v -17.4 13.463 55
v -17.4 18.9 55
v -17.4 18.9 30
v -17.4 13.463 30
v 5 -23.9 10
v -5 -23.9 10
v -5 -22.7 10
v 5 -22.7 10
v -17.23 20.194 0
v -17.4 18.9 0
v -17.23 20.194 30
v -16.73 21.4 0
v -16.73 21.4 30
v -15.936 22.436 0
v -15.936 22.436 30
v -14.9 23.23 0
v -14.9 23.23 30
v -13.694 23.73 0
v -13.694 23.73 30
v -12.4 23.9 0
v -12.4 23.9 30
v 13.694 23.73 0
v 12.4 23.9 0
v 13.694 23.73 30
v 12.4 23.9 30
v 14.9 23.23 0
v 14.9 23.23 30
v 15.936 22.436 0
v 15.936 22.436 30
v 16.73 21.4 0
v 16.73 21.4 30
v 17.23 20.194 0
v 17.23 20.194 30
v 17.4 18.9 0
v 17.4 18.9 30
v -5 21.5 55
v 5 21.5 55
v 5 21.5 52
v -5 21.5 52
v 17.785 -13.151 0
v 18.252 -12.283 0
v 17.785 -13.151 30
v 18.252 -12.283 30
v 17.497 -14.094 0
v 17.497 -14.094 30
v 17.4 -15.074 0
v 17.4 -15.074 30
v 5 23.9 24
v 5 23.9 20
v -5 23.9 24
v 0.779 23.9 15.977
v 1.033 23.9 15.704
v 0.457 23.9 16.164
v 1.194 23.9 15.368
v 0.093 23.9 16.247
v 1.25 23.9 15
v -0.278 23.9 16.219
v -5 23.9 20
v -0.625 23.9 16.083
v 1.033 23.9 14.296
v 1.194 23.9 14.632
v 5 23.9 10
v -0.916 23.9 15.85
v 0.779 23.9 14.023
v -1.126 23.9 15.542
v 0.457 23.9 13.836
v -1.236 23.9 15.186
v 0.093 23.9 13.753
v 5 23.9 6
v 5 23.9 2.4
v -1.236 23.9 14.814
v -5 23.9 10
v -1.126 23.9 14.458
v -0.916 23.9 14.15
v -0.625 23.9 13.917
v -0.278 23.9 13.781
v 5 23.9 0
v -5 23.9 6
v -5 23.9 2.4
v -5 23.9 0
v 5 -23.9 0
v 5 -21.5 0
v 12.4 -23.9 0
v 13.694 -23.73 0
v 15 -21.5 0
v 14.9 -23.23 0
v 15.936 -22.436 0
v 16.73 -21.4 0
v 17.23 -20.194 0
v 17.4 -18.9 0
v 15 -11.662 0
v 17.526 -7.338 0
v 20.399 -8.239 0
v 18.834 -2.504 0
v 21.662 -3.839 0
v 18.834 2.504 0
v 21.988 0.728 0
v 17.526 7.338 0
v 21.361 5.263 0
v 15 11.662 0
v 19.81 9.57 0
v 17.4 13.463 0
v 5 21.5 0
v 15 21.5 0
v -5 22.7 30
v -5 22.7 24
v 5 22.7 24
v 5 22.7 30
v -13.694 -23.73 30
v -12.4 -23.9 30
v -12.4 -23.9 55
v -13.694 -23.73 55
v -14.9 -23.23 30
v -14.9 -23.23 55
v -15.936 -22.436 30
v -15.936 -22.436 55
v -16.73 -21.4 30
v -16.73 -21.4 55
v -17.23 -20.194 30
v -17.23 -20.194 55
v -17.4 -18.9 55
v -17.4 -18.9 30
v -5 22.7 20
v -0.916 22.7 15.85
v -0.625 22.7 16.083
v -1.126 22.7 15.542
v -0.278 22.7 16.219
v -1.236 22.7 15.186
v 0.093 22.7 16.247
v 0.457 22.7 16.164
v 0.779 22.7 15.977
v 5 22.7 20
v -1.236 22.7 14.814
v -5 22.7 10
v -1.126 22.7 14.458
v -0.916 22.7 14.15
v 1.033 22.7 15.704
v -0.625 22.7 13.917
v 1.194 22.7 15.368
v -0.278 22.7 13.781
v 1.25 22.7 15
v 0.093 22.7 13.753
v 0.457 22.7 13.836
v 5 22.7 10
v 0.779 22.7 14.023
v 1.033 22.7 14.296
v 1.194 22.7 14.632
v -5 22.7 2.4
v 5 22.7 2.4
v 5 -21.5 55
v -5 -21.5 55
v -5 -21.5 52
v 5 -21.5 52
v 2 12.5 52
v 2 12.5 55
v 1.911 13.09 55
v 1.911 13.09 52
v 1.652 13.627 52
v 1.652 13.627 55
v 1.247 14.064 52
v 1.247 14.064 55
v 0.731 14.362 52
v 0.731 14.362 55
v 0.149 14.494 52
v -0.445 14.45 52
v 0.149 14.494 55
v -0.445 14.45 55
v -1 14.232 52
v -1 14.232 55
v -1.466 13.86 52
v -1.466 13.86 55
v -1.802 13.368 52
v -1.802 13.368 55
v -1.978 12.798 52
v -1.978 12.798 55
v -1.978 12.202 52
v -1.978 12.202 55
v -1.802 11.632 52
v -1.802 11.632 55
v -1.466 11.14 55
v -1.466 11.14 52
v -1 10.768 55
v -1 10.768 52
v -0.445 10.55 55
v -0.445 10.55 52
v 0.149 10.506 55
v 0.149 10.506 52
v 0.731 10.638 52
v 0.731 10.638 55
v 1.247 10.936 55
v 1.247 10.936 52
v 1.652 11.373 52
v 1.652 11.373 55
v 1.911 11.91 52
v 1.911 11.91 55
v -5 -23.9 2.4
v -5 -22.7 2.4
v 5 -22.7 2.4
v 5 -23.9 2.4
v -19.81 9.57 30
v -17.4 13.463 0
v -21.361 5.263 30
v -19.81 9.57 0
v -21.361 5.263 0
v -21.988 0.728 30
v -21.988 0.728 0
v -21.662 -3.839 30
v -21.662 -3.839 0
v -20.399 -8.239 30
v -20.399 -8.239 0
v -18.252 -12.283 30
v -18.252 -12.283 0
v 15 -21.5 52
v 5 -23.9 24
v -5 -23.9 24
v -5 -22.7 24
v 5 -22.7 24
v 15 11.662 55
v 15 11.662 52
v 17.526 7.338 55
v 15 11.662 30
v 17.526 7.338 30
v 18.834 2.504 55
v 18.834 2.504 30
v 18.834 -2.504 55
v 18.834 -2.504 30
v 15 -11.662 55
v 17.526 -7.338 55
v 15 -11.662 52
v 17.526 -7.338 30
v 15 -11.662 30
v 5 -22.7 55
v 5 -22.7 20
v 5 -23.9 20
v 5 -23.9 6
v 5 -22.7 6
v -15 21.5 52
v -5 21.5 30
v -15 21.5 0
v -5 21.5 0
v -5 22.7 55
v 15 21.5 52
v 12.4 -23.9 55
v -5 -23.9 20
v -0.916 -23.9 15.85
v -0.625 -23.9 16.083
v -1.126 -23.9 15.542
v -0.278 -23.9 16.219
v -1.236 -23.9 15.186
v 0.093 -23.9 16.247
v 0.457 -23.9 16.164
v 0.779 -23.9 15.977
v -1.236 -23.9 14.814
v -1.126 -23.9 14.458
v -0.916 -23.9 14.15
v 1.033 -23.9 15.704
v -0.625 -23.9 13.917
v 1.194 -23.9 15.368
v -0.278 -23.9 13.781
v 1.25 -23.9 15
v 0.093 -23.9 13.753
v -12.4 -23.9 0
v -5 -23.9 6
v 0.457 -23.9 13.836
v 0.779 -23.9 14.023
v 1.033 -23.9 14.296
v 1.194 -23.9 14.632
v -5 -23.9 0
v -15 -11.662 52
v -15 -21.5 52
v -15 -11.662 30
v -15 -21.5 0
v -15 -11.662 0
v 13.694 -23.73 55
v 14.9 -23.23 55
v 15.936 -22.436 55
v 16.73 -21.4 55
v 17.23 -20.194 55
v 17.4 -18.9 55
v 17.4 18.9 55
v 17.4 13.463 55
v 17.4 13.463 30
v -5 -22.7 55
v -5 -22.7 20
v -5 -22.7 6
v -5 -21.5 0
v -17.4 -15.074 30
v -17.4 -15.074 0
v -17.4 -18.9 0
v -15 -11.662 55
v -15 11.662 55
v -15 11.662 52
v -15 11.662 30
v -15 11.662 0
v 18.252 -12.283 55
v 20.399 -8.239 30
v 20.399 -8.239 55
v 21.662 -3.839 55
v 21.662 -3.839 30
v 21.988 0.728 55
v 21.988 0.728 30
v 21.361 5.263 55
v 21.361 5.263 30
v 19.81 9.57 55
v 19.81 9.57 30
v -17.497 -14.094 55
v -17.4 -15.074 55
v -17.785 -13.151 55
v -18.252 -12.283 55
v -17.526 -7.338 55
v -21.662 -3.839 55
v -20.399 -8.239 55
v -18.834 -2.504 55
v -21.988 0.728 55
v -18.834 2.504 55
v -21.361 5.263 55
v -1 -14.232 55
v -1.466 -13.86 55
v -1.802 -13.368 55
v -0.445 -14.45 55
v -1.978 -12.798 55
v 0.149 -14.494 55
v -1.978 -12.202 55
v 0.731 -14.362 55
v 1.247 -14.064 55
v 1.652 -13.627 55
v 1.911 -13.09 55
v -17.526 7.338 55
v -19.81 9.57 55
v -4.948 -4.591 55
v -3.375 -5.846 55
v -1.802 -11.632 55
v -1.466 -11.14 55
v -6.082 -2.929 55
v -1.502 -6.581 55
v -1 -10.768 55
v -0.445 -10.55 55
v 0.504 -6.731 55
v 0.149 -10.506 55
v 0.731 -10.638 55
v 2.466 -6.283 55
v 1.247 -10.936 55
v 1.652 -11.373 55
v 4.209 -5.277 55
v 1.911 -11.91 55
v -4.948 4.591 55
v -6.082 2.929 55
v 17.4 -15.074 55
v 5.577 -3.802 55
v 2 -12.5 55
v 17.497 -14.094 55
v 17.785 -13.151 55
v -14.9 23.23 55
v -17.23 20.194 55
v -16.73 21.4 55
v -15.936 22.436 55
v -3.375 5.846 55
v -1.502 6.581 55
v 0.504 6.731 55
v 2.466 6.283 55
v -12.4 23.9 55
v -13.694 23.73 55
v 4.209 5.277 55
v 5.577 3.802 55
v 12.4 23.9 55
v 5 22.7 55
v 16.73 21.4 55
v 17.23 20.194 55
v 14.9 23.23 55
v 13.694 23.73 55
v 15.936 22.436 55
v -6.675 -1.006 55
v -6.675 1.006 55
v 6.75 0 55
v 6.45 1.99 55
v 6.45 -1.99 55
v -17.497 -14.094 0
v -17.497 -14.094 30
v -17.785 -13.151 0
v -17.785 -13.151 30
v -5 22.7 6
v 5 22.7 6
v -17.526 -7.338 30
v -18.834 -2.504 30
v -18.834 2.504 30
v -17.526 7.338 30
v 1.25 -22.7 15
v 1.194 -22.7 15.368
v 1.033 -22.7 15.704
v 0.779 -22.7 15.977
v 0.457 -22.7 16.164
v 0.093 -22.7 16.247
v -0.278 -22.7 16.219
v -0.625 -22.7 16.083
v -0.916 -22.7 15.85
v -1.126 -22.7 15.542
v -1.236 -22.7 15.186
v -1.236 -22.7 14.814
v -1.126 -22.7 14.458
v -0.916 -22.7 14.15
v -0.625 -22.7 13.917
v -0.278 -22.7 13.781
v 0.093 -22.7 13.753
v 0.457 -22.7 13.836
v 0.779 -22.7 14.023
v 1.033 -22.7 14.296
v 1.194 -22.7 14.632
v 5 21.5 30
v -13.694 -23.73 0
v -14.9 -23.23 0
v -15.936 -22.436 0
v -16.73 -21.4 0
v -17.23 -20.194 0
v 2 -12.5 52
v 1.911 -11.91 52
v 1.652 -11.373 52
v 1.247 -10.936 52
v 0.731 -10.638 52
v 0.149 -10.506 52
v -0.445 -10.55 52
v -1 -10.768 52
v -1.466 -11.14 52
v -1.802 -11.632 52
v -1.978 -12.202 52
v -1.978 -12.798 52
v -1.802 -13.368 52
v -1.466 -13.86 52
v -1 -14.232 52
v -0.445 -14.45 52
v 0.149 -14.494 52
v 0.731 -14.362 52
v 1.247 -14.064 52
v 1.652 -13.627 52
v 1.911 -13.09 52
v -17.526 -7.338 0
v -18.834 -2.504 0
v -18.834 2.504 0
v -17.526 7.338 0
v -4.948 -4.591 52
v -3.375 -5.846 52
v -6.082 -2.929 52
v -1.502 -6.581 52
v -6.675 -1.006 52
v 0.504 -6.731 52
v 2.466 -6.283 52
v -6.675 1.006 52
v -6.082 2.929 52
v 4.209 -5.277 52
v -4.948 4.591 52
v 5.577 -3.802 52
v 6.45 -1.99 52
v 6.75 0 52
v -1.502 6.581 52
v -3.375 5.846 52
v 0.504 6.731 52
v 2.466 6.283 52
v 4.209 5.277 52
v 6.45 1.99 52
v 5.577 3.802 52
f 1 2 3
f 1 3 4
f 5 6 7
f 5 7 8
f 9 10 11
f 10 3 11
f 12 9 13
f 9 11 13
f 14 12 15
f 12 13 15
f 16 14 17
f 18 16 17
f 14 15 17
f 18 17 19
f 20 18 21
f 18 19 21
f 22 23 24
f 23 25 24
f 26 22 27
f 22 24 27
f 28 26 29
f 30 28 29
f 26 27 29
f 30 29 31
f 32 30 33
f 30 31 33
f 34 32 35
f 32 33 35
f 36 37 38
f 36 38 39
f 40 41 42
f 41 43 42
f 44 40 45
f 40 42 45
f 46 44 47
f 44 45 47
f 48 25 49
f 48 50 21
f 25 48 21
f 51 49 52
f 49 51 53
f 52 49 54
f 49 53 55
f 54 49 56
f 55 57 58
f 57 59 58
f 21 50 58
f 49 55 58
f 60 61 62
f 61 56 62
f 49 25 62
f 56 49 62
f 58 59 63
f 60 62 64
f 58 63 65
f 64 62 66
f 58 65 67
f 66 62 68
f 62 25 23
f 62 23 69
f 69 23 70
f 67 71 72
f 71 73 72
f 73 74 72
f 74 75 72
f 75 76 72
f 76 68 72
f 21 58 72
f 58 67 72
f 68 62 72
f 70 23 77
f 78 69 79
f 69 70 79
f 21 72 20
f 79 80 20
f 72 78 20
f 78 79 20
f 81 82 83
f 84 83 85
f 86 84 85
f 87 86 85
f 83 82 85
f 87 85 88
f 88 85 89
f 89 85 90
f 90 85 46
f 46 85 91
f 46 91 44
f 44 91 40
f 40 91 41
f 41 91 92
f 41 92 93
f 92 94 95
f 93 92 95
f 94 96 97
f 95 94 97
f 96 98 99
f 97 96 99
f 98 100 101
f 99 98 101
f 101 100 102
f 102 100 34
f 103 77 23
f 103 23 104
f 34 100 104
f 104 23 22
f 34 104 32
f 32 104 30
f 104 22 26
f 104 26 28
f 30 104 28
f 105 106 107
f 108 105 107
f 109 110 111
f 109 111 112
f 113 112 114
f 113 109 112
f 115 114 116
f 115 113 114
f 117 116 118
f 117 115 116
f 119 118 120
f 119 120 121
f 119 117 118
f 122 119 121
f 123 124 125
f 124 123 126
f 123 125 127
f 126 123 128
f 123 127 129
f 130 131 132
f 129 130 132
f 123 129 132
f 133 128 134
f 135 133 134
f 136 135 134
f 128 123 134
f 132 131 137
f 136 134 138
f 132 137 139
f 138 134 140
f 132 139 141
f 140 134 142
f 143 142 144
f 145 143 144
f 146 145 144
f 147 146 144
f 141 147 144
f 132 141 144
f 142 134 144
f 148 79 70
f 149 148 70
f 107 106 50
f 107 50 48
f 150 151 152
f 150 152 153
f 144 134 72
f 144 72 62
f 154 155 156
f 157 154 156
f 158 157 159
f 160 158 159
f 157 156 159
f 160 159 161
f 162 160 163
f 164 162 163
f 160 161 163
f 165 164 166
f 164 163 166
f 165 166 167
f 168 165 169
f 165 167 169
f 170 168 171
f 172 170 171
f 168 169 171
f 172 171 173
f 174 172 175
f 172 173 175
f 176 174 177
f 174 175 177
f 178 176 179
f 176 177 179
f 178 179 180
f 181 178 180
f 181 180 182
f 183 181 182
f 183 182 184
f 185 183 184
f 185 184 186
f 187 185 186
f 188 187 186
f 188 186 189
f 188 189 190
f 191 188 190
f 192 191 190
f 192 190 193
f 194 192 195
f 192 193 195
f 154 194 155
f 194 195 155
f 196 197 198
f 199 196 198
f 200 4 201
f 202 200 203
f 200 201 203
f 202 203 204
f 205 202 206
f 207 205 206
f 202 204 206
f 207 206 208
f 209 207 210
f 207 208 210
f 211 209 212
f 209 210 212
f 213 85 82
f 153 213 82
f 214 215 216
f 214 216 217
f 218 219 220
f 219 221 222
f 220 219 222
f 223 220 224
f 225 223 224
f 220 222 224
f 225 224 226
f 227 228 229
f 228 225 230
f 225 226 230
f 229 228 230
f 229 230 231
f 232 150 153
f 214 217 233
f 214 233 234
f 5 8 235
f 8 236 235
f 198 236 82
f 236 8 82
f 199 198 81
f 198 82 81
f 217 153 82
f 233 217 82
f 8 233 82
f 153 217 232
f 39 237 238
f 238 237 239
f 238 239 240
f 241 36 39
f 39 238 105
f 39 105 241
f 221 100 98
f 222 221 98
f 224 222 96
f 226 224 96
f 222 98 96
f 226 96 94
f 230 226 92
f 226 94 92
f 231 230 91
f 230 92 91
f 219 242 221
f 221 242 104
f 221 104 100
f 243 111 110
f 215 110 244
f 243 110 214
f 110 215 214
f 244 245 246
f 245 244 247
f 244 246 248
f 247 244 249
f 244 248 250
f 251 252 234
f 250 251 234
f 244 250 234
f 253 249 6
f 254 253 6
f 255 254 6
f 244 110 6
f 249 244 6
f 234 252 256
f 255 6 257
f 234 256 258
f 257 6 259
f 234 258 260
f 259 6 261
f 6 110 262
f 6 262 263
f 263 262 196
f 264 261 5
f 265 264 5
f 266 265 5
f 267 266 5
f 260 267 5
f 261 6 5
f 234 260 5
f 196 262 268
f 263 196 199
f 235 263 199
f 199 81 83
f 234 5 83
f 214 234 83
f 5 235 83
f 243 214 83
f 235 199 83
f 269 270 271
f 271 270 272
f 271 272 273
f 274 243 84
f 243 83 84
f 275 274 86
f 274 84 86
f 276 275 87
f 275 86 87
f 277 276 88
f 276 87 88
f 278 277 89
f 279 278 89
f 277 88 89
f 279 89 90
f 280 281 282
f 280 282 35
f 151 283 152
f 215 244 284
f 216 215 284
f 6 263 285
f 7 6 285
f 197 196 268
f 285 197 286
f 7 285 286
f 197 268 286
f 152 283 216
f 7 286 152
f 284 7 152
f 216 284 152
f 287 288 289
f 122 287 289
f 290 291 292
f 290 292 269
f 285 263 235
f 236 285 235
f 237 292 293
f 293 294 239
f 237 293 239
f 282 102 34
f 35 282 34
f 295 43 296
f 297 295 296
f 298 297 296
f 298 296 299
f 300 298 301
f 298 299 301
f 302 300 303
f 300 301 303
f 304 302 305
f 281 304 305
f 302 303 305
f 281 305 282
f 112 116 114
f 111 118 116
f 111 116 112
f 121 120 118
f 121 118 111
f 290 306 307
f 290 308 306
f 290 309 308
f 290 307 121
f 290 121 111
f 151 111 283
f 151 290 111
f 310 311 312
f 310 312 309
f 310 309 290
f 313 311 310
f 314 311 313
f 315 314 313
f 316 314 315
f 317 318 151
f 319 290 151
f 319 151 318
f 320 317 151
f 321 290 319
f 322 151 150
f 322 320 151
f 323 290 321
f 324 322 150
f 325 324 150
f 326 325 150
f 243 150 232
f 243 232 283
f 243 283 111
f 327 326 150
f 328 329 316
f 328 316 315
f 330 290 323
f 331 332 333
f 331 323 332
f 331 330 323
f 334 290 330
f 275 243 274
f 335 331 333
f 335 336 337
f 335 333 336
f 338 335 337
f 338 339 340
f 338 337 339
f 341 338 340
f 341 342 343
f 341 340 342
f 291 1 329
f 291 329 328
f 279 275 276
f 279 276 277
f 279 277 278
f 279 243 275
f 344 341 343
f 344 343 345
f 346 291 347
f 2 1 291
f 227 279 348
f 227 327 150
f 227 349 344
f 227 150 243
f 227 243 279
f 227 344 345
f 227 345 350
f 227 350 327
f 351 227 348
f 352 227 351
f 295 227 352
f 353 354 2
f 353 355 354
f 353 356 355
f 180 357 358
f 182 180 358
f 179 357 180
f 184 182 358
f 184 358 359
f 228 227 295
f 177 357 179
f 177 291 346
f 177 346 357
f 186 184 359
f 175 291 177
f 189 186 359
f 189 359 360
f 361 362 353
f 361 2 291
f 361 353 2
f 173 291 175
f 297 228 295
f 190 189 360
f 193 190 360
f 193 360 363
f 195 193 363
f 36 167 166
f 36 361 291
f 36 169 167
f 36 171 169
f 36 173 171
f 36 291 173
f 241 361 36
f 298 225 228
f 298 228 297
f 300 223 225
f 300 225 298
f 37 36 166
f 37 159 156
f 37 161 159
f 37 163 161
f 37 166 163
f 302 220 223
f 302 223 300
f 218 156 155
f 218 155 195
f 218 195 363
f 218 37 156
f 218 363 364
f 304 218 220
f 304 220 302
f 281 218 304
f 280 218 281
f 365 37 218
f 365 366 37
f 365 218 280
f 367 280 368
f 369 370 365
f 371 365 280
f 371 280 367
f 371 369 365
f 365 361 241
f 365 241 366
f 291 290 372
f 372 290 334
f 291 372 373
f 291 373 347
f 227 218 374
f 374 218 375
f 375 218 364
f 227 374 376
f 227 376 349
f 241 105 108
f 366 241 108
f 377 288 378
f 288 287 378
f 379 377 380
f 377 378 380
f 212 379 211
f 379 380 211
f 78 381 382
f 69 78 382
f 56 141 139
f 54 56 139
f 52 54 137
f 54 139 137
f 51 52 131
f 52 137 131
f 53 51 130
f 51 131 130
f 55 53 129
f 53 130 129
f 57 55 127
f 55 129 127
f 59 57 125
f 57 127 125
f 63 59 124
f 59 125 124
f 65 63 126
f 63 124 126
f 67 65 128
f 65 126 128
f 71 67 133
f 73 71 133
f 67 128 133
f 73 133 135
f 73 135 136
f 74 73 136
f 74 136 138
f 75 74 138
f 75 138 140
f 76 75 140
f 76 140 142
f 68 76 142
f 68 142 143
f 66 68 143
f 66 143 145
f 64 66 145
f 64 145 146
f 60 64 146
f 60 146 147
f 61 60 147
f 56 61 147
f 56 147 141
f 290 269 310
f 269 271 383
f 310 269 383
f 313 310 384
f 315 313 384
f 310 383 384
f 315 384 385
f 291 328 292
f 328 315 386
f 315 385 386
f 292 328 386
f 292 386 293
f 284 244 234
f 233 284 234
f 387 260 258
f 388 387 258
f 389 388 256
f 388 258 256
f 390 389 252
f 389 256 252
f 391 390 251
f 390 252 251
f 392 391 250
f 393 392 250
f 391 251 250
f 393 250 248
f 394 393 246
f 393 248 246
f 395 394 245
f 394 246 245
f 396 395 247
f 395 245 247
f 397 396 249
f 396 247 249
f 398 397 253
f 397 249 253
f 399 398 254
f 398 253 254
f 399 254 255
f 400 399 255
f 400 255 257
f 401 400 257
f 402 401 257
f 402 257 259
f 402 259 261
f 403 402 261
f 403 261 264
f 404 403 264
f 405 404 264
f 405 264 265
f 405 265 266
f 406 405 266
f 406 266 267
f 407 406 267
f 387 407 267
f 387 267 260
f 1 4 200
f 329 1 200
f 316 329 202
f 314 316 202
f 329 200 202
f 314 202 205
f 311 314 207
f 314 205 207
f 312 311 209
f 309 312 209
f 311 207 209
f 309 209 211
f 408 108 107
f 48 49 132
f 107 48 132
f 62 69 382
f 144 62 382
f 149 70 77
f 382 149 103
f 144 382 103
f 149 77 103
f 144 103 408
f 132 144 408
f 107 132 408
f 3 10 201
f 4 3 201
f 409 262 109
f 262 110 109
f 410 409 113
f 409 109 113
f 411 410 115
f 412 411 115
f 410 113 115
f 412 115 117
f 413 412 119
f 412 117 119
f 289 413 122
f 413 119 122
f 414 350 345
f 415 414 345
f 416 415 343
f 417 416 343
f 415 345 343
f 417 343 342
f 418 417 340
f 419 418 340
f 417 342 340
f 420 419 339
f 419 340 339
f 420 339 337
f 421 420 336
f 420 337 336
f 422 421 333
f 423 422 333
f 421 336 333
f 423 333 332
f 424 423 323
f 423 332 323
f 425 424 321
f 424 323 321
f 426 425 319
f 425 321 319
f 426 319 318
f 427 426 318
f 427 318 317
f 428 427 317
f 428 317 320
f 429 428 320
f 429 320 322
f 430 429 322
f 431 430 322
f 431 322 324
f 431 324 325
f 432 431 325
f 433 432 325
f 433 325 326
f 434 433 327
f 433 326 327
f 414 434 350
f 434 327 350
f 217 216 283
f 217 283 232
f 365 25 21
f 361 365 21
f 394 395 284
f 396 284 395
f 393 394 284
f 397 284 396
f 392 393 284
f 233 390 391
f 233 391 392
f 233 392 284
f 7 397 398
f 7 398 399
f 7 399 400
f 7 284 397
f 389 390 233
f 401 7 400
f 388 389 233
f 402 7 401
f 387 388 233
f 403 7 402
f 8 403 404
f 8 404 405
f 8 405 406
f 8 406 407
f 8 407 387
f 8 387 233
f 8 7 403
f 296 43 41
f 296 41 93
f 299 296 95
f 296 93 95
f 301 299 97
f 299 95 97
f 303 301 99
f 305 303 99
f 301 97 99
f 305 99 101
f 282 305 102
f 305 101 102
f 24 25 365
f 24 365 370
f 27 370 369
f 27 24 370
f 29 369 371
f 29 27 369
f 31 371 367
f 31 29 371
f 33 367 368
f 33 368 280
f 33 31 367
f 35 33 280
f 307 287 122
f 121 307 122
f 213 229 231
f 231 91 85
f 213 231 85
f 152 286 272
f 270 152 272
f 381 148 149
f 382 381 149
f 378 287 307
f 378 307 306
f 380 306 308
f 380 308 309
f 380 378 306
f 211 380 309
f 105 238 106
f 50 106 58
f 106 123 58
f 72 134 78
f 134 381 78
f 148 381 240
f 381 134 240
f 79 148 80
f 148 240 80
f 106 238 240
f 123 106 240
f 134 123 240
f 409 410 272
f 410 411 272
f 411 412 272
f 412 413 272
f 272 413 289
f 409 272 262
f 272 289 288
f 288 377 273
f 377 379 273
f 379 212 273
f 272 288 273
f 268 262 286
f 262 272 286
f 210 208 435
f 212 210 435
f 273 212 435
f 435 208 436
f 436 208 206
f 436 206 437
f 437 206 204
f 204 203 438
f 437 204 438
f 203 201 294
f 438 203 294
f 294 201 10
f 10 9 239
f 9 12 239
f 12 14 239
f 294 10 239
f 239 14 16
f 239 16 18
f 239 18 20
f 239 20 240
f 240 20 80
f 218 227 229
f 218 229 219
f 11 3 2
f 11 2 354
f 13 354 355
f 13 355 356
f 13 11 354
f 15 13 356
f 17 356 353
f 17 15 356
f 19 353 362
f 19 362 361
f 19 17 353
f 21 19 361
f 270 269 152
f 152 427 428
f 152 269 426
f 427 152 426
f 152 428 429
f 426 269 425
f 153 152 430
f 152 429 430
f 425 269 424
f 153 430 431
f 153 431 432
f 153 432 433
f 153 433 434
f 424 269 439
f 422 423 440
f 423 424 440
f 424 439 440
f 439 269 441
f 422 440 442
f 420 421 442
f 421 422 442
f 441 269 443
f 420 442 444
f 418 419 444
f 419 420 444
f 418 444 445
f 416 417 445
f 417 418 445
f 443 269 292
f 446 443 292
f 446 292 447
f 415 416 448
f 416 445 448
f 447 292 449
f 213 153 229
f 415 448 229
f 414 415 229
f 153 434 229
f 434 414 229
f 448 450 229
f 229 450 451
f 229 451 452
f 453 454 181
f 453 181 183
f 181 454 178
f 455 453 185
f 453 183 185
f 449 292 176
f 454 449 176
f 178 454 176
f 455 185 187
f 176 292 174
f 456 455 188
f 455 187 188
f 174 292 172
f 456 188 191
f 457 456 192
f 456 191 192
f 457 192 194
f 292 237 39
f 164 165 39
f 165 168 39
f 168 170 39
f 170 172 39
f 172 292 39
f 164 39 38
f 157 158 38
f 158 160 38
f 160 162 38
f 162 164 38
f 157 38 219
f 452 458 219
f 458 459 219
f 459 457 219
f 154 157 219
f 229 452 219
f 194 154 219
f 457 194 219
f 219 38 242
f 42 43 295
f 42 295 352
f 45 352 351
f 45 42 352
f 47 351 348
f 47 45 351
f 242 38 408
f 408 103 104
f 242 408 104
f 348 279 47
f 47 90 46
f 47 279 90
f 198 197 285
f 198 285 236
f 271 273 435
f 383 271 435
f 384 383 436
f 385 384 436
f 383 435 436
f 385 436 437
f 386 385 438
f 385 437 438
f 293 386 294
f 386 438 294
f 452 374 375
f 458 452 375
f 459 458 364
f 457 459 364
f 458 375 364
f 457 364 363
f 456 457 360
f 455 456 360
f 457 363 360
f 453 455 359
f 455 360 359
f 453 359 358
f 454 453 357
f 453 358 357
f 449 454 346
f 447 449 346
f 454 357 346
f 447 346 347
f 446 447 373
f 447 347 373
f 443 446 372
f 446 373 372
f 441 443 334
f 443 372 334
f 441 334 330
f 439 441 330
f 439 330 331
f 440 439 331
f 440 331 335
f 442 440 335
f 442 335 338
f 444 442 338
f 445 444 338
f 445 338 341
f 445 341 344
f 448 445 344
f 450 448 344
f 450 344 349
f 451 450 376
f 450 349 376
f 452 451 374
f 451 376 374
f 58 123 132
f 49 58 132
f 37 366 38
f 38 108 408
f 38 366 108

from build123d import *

# Parameters (mm, degrees)
F0_W     = 10
F0_H     = 1.2
F1_DEPTH = 30
F2_W     = 10
F2_H     = 4
F2_R     = 1.25
F3_DEPTH = 47.801
F4_DEPTH = 2.4
F5_R     = 5
F6_DEPTH = 25
F7_R     = 2
F7_R_2   = 6.75
F8_DEPTH = 3


# Not quite as in the source:
# - a feature names something its author has since deleted; it is built from what else it names


with BuildPart() as f1:
    # F0 (on Top) → F1 (new body)
    with BuildSketch(Plane.XY):
        with BuildLine():
            Line((15, -11.6619037897), (15, -21.5))
            Line((15, -21.5), (5, -21.5))
            Line((5, -21.5), (5, -22.7))
            Line((5, -22.7), (5, -23.9))
            Line((5, -23.9), (17.4, -23.9))
            Line((17.4, -23.9), (17.4, -13.462540622))
            ThreePointArc((17.4, -13.462540622), (22, 0), (17.4, 13.462540622))
            Line((17.4, 13.462540622), (17.4, 23.9))
            Line((17.4, 23.9), (5, 23.9))
            Line((5, 23.9), (5, 22.7))
            Line((5, 22.7), (5, 21.5))
            Line((5, 21.5), (15, 21.5))
            Line((15, 21.5), (15, 11.6619037897))
            ThreePointArc((15, 11.6619037897), (19, 0), (15, -11.6619037897))
        make_face()
        with Locations((0, 23.3)):
            Rectangle(F0_W, F0_H)
        with BuildLine():
            Line((-5, -23.9), (-5, -22.7))
            Line((-5, -22.7), (-5, -21.5))
            Line((-5, -21.5), (-15, -21.5))
            Line((-15, -21.5), (-15, -11.6619037897))
            ThreePointArc((-15, -11.6619037897), (-19, 0), (-15, 11.6619037897))
            Line((-15, 11.6619037897), (-15, 21.5))
            Line((-15, 21.5), (-5, 21.5))
            Line((-5, 21.5), (-5, 22.7))
            Line((-5, 22.7), (-5, 23.9))
            Line((-5, 23.9), (-17.4, 23.9))
            Line((-17.4, 23.9), (-17.4, 13.462540622))
            ThreePointArc((-17.4, 13.462540622), (-22, 0), (-17.4, -13.462540622))
            Line((-17.4, -13.462540622), (-17.4, -23.9))
            Line((-17.4, -23.9), (-5, -23.9))
        make_face()
        with Locations((0, -23.3)):
            Rectangle(F0_W, F0_H)
    extrude(amount=F1_DEPTH)

    # F2 (on face) → F3 (cut, through all)
    with BuildSketch(Plane.XZ.offset(23.9)):
        with Locations((0, 22)):
            Rectangle(F2_W, F2_H)
        with Locations((0, 8)):
            Rectangle(F2_W, F2_H)
        with Locations((0, 15)):
            Circle(F2_R)
    extrude(amount=-F3_DEPTH, mode=Mode.SUBTRACT)

    # F0 (on Top) → F4 (cut)
    with BuildSketch(Plane.XY):
        with Locations((0, 23.3)):
            Rectangle(F0_W, F0_H)
        with Locations((0, -23.3)):
            Rectangle(F0_W, F0_H)
    extrude(amount=F4_DEPTH, mode=Mode.SUBTRACT)

    # F5
    f5_edges = [f1.edges().sort_by_distance(p)[0] for p in [
        (-17.4, -23.9, 15),
        (17.4, -23.9, 15),
        (-17.4, -13.462541, 15),
        (-17.4, 23.9, 15),
        (17.4, 23.9, 15),
        (17.4, -13.462541, 15),
    ]]
    fillet(f5_edges, radius=F5_R)

    # F6 (add): a face of the model
    f6_faces = [f1.faces().sort_by_distance(p)[0] for p in [
        (16.7503200788, -16.9872408745, 30),
    ]]
    extrude(f6_faces, amount=F6_DEPTH)

    # F7 (on face) → F8 (join)
    with BuildSketch(Plane.XY.offset(55)):
        Polygon((-15, -11.6619037897), (-15, -21.5), (-5, -21.5), (5, -21.5), (15, -21.5), (15, -11.6619037897), (15, 11.6619037897), (15, 21.5), (5, 21.5), (-5, 21.5), (-15, 21.5), (-15, 11.6619037897), align=None)
        with Locations((0, -12.5)):
            Circle(F7_R, mode=Mode.SUBTRACT)
        Circle(F7_R_2, mode=Mode.SUBTRACT)
        with Locations((0, 12.5)):
            Circle(F7_R, mode=Mode.SUBTRACT)
    extrude(amount=-F8_DEPTH)


solid = f1.part
